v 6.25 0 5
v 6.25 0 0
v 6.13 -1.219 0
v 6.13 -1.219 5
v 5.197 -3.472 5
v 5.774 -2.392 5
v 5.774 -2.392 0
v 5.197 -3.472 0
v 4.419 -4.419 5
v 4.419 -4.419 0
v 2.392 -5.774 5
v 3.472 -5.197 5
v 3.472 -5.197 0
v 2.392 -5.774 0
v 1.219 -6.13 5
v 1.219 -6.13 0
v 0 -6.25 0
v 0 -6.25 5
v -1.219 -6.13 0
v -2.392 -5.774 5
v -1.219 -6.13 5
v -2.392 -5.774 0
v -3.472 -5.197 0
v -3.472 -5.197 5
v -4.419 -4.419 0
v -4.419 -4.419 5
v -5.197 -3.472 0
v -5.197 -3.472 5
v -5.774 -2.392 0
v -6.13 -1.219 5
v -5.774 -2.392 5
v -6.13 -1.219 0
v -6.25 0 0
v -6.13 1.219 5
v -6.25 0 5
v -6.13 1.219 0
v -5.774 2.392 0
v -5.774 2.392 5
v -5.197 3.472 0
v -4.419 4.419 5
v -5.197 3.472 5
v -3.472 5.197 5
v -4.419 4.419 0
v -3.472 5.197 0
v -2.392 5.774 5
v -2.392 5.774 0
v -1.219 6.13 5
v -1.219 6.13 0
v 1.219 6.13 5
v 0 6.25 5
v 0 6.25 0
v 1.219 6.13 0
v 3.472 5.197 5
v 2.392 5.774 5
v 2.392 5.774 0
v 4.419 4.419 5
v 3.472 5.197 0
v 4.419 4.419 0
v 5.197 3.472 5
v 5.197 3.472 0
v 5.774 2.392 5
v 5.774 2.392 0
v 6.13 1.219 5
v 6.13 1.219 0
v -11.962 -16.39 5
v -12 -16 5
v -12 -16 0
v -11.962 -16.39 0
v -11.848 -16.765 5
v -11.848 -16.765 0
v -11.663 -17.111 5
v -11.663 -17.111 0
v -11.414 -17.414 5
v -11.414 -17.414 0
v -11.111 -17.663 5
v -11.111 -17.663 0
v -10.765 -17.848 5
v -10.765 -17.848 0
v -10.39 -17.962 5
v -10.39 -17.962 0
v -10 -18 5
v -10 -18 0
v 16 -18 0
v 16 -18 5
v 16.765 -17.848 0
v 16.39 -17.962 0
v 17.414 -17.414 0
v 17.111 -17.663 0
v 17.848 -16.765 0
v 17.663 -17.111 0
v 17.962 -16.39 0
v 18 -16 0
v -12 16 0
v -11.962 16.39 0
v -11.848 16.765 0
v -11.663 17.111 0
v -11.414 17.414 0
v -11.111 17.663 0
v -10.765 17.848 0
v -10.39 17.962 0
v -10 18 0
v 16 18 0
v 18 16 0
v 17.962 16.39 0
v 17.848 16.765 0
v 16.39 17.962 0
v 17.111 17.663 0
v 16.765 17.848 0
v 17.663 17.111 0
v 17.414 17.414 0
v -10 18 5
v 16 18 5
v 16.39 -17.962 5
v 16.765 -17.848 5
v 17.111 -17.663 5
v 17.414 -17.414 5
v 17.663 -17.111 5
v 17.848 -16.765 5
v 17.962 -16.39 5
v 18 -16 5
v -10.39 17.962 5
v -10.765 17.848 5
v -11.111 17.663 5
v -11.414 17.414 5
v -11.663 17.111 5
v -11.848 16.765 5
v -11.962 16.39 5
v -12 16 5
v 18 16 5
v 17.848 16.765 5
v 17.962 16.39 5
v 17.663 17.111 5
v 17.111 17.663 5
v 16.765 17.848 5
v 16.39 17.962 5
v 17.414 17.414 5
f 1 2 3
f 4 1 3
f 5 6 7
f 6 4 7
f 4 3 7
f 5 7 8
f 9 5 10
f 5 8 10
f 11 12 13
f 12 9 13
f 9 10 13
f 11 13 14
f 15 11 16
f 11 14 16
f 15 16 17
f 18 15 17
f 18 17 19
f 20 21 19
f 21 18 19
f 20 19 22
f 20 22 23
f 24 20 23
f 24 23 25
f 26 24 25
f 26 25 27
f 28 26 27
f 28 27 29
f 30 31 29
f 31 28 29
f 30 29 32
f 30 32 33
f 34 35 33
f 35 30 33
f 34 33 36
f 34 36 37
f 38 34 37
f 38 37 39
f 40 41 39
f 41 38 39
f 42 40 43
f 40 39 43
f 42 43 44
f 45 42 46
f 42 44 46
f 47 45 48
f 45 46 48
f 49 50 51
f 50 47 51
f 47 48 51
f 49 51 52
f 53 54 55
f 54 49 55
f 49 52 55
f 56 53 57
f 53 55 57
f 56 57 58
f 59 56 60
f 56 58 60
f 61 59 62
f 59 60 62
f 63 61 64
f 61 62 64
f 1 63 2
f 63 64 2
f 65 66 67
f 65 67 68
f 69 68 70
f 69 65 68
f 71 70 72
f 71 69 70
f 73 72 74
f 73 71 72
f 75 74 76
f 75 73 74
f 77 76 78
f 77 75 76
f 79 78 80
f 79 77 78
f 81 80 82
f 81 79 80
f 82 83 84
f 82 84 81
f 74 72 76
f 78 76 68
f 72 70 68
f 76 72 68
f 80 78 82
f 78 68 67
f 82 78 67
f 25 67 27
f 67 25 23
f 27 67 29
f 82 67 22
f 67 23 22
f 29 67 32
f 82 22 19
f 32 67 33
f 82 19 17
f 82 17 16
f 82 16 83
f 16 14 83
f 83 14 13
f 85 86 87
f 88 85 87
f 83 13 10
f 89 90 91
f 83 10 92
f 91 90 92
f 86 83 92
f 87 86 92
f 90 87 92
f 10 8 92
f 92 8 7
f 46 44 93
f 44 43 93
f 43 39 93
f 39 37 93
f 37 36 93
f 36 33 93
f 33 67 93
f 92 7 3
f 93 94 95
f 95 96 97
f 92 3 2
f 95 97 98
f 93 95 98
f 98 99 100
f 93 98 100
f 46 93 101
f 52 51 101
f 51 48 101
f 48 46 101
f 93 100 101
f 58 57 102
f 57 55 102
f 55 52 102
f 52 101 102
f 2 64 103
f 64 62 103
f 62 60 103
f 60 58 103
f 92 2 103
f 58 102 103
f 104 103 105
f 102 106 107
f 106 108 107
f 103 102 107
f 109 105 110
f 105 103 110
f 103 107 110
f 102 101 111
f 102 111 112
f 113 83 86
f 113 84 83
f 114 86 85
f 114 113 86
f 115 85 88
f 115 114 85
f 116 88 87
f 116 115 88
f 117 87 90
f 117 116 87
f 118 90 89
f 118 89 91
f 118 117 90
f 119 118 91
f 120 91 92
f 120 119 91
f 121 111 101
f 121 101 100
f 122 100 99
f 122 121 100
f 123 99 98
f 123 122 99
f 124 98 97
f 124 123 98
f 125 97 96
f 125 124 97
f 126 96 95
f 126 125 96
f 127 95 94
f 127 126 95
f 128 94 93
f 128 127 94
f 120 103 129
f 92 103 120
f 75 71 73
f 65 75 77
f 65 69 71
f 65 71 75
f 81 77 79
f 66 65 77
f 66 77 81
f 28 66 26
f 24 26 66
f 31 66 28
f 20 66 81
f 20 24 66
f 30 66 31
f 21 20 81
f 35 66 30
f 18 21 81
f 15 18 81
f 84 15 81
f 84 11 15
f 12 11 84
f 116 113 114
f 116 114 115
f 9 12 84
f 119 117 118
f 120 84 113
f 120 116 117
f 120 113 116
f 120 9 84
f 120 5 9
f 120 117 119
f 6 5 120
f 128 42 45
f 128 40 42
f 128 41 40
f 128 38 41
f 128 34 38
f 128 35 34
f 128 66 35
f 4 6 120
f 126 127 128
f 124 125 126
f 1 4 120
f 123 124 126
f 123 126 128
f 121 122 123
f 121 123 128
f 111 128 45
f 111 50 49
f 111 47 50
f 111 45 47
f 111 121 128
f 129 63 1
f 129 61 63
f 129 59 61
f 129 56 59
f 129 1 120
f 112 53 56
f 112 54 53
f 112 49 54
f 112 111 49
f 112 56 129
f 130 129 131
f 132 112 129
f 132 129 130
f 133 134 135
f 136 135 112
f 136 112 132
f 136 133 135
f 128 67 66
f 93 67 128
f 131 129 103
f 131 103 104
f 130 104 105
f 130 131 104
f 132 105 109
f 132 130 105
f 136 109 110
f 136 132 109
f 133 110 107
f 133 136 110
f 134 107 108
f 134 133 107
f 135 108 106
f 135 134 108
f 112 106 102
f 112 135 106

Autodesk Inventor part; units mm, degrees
ref_plane "YZ Plane" through (0, 0, 0) normal (1, 0, 0) x (0, 1, 0)
ref_plane "XZ Plane" through (0, 0, 0) normal (0, 1, 0) x (-1, 0, 0)
ref_plane "XY Plane" through (0, 0, 0) normal (0, 0, 1) x (1, 0, 0)
sketch "Эскиз1" plane through (0, 0, 0) normal (0, 0, 1) x (1, 0, 0)
  line L0 (18, -18) -> (-12, -18)
  line L1 (-12, -18) -> (-12, 18)
  line L2 (-12, 18) -> (18, 18)
  line L3 (18, 18) -> (18, -18)
  circle A0 centre (0, 0) radius 6.25
  dimension "d0" = 36
  dimension "d1" = 12.5
  dimension "d5" = 18
  dimension "d6" = 12
  dimension "d8" = 30
extrude "Выдавливание1" add sketch "Эскиз1" along normal blind 5
fillet "Сопряжение1" radius 2 4 edges at (-12, -18, 2.5) (-12, 18, 2.5) (18, 18, 2.5) (18, -18, 2.5)
properties part number "платик под редуктор"
